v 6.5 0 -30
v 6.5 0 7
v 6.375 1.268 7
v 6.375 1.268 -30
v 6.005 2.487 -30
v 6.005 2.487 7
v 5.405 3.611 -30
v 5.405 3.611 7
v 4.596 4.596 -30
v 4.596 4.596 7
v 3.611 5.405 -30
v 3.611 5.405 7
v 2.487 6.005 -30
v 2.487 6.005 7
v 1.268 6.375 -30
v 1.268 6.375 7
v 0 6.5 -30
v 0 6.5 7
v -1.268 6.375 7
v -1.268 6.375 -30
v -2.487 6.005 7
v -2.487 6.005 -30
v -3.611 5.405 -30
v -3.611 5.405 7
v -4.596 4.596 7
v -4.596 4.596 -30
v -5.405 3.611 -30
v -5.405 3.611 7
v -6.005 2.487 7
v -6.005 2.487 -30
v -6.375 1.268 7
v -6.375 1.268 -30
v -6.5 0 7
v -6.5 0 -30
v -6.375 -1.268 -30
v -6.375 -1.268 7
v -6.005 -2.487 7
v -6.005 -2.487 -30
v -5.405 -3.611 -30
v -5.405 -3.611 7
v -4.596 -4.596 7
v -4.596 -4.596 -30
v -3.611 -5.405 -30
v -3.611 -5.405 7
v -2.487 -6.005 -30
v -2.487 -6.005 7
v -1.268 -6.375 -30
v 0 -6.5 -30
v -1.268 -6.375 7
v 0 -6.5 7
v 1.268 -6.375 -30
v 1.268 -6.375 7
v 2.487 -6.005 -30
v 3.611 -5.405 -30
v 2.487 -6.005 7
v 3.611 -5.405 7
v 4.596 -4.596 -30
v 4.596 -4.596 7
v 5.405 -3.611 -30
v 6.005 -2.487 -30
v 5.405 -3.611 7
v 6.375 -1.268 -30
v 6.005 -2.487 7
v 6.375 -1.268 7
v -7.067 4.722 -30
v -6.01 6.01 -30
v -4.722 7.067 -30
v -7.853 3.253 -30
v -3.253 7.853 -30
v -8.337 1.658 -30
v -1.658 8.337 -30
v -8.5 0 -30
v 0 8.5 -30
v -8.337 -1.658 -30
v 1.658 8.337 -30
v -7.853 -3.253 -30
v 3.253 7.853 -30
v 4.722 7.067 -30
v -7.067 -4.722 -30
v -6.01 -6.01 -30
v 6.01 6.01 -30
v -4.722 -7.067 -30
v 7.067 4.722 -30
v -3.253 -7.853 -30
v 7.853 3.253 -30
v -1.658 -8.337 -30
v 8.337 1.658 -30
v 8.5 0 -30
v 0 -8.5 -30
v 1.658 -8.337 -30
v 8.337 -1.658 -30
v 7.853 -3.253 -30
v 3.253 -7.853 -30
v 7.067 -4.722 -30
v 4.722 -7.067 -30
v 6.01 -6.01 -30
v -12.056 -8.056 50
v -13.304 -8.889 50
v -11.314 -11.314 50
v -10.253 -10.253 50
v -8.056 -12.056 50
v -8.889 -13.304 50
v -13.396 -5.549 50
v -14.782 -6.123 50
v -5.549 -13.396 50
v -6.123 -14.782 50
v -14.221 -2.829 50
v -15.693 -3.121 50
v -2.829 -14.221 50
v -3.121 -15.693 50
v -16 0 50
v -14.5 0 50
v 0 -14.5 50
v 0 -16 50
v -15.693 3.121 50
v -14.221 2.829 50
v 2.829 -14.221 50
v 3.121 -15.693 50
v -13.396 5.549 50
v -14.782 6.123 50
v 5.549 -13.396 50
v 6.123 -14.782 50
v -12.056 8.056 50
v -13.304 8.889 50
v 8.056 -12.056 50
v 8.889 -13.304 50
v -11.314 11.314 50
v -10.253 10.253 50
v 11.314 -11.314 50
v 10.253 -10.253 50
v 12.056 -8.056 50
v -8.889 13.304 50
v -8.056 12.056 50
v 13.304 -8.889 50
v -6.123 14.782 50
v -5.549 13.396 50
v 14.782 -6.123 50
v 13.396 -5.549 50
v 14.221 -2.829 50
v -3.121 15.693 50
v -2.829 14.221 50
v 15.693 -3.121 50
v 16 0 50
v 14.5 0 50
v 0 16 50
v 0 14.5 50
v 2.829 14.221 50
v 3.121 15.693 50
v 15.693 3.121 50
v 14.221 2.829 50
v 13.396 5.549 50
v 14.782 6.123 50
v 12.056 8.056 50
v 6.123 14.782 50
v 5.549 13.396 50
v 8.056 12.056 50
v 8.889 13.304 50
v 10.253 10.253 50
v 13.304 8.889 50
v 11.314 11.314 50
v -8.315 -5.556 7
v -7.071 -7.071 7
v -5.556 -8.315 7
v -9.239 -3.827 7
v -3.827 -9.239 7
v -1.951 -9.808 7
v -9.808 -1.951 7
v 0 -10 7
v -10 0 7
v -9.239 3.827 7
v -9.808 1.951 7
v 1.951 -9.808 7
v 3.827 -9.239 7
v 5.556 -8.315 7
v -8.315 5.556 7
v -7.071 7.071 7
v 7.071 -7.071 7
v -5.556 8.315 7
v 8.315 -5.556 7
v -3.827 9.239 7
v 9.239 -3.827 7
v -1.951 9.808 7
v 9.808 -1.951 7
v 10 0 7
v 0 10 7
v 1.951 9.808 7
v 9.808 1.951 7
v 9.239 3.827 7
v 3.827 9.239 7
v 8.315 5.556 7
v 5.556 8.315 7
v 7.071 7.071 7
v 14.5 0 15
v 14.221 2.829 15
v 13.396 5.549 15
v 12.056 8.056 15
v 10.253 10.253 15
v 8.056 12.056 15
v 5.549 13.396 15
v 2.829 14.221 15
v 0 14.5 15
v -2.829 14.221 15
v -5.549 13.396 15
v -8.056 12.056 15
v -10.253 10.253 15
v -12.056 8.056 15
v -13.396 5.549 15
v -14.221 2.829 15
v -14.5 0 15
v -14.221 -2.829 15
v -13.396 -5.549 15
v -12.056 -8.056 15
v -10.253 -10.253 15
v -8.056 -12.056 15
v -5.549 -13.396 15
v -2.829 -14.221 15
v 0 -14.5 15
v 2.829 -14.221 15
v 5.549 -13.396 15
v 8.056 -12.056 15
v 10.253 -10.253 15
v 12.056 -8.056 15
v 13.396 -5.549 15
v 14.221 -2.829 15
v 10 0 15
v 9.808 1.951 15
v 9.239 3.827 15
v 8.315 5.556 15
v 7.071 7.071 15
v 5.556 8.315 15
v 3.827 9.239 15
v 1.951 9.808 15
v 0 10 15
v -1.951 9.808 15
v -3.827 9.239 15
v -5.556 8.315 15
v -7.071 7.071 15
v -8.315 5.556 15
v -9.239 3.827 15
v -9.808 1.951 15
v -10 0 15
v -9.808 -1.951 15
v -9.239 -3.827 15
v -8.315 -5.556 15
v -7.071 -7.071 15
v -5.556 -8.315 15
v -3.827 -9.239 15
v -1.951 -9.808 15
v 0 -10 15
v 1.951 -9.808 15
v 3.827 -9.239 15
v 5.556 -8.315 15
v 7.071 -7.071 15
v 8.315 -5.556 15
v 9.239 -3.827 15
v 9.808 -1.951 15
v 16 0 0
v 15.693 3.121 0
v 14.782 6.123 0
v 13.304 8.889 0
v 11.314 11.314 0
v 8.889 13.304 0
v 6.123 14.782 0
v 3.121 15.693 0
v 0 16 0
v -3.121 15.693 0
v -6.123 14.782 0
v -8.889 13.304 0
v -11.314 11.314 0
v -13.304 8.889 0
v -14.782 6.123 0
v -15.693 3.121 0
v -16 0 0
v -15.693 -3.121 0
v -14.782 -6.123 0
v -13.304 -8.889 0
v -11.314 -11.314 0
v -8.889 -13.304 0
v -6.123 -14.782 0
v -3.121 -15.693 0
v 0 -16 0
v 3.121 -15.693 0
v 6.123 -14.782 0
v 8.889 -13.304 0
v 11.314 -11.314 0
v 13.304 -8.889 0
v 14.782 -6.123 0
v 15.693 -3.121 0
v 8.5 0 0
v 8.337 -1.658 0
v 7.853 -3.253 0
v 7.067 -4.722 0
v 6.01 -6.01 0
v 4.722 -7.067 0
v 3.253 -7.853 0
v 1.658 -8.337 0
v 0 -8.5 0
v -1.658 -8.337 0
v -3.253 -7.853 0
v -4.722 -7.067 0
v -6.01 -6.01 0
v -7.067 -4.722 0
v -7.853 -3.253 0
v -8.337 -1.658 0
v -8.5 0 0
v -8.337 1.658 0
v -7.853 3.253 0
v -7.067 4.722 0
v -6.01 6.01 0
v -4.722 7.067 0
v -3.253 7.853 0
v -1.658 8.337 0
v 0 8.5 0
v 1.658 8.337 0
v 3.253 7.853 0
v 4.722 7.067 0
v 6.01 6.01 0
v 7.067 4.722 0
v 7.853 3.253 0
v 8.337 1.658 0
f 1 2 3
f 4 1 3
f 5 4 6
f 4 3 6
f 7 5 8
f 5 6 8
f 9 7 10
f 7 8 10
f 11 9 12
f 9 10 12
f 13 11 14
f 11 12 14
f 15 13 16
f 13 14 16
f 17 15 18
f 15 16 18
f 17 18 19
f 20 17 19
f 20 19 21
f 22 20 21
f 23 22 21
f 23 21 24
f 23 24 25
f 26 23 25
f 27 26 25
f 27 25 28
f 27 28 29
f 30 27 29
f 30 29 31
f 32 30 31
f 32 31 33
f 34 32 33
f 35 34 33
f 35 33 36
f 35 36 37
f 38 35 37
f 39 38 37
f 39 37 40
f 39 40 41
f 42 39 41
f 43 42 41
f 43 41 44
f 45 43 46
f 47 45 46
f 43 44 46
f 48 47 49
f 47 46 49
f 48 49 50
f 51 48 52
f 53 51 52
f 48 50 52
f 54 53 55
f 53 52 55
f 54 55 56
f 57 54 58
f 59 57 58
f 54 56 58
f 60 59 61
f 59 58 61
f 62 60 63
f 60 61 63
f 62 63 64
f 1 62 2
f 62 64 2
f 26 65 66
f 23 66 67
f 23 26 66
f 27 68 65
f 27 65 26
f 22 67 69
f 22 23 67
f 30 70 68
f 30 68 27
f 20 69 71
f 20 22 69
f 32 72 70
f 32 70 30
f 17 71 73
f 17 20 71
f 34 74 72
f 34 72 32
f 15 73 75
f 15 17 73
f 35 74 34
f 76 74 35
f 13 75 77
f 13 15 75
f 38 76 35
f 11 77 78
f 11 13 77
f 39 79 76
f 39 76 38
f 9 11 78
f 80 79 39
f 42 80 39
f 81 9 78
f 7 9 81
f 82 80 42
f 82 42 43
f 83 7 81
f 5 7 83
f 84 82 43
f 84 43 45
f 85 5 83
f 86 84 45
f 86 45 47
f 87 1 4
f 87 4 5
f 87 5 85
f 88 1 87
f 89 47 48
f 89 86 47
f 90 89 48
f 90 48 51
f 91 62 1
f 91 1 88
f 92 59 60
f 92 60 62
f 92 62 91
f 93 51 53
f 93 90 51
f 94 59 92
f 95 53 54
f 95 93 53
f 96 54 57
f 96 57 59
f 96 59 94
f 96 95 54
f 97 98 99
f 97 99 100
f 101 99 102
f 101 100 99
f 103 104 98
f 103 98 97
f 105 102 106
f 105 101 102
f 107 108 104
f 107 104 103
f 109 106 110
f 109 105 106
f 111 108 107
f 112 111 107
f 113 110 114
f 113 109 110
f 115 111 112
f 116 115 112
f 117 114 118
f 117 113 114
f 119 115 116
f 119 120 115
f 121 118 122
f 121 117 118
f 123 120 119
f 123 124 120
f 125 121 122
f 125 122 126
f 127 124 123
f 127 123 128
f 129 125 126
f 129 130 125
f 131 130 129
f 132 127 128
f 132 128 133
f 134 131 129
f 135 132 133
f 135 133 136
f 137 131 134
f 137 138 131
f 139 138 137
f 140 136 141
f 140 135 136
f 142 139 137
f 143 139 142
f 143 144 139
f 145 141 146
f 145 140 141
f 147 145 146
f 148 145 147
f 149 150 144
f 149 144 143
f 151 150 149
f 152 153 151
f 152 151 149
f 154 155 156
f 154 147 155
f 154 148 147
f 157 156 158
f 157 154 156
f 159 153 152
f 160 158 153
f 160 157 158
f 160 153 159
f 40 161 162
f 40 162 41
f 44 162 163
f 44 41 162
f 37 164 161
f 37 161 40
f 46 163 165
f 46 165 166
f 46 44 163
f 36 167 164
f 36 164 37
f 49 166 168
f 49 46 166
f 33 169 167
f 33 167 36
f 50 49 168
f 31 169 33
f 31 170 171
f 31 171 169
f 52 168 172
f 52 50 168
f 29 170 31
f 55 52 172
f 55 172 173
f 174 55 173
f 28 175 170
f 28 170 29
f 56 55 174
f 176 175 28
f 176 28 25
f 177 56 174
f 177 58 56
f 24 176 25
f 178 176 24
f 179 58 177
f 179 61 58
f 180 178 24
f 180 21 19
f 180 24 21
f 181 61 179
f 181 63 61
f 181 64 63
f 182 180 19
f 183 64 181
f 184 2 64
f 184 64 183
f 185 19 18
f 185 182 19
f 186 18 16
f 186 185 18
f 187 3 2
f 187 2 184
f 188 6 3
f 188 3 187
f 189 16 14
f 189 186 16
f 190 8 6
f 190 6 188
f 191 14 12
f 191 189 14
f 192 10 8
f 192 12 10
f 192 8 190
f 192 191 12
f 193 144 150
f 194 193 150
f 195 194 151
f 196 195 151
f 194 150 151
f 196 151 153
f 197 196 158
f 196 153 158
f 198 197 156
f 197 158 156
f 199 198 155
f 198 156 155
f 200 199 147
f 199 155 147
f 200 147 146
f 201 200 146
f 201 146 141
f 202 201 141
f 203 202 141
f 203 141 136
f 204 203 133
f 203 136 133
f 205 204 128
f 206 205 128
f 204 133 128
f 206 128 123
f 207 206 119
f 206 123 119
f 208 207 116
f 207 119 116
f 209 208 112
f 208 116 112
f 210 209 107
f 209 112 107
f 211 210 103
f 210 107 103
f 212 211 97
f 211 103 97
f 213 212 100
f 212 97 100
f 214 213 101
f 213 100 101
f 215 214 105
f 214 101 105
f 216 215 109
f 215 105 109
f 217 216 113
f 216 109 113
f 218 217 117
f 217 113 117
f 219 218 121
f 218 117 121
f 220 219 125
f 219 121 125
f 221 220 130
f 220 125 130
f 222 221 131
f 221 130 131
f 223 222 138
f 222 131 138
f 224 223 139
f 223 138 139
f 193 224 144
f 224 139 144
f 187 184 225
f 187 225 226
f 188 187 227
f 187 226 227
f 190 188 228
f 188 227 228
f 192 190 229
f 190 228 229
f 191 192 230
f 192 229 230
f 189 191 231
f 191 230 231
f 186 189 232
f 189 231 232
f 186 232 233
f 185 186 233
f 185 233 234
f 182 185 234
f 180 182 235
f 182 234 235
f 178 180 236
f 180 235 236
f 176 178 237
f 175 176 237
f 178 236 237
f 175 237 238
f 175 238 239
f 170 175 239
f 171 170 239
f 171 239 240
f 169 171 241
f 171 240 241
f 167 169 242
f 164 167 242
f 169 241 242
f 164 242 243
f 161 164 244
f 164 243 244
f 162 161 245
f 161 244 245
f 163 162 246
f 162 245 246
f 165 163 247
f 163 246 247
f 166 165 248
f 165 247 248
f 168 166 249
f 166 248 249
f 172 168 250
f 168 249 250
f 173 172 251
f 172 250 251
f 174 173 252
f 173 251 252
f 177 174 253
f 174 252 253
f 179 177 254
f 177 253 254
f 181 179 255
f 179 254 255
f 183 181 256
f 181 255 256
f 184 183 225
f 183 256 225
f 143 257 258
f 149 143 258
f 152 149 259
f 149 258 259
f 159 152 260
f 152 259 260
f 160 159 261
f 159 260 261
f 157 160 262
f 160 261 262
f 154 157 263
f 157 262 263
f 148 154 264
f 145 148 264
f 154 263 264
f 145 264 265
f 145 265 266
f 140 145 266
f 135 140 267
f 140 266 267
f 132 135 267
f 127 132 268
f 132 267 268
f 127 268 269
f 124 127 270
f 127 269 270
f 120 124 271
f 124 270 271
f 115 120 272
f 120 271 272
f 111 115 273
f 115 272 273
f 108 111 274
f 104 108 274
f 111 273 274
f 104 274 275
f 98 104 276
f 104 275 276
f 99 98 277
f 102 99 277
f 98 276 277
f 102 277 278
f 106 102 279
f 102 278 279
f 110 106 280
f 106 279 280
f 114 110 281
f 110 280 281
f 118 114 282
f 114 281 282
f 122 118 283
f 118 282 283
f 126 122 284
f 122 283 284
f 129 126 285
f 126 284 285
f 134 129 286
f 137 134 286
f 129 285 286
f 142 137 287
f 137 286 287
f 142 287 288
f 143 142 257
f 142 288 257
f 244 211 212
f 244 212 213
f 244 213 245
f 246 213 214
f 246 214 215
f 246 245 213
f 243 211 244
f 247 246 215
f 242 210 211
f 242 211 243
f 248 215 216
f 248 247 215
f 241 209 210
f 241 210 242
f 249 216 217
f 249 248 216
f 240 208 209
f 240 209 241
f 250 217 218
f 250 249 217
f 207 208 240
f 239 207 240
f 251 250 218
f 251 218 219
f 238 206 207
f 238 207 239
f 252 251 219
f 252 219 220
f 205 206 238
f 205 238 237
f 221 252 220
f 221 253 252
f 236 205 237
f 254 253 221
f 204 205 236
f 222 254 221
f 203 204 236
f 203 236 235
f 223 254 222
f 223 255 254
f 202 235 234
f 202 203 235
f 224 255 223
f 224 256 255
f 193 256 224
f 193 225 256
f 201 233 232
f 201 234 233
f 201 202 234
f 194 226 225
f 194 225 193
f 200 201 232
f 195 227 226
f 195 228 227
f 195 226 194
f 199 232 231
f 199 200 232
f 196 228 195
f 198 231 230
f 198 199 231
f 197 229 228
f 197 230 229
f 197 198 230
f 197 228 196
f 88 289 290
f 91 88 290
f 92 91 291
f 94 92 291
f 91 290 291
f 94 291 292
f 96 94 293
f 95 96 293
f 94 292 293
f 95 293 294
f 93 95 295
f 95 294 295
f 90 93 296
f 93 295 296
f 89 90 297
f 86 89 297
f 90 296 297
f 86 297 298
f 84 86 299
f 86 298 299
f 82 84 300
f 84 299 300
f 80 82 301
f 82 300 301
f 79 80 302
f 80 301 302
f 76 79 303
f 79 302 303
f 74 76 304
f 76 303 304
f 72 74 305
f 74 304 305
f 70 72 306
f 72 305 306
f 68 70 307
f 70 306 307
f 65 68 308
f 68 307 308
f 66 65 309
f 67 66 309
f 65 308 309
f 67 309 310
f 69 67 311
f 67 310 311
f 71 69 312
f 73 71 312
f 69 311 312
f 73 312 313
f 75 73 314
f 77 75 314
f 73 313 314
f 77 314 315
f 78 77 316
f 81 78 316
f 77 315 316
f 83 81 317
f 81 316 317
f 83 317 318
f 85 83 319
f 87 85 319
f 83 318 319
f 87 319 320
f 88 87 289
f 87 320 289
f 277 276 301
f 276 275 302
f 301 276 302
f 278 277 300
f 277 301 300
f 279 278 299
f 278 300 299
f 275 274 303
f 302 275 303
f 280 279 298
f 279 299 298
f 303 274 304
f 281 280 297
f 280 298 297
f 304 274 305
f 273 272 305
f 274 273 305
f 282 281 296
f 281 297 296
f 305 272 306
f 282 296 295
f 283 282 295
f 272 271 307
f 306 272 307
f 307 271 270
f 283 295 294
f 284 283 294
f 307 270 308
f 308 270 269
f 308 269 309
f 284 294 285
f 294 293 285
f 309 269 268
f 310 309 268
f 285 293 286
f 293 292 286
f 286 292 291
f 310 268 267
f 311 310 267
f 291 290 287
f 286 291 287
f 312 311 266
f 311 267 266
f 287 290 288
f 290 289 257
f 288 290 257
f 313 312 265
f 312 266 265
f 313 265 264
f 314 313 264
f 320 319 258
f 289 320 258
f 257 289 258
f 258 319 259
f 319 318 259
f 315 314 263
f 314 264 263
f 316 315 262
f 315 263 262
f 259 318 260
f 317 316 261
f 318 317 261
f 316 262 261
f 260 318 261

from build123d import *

# Parameters (mm, degrees)
F0_R     = 16
F1_DEPTH = 50
F2_R     = 14.5
F3_DEPTH = 35
F4_R     = 8.5
F5_DEPTH = 30
F6_R     = 6.5
F7_DEPTH = 45.001
F8_R     = 10
F9_DEPTH = 8


with BuildPart() as f1:
    # F0 (on Top) → F1 (new body)
    with BuildSketch(Plane.XY):
        Circle(F0_R)
    extrude(amount=F1_DEPTH)

    # F2 (on face) → F3 (cut)
    with BuildSketch(Plane.XY.offset(50)):
        Circle(F2_R)
    extrude(amount=-F3_DEPTH, mode=Mode.SUBTRACT)

    # F4 (on face) → F5 (join)
    with BuildSketch(Plane(origin=(0, 0, 0), x_dir=(1, 0, 0), z_dir=(0, 0, -1))):
        Circle(F4_R)
    extrude(amount=F5_DEPTH)

    # F6 (on face) → F7 (cut, through all)
    with BuildSketch(Plane.XY.offset(15)):
        Circle(F6_R)
    extrude(amount=-F7_DEPTH, mode=Mode.SUBTRACT)

    # F8 (on face) → F9 (cut)
    with BuildSketch(Plane.XY.offset(15)):
        Circle(F8_R)
    extrude(amount=-F9_DEPTH, mode=Mode.SUBTRACT)


solid = f1.part
